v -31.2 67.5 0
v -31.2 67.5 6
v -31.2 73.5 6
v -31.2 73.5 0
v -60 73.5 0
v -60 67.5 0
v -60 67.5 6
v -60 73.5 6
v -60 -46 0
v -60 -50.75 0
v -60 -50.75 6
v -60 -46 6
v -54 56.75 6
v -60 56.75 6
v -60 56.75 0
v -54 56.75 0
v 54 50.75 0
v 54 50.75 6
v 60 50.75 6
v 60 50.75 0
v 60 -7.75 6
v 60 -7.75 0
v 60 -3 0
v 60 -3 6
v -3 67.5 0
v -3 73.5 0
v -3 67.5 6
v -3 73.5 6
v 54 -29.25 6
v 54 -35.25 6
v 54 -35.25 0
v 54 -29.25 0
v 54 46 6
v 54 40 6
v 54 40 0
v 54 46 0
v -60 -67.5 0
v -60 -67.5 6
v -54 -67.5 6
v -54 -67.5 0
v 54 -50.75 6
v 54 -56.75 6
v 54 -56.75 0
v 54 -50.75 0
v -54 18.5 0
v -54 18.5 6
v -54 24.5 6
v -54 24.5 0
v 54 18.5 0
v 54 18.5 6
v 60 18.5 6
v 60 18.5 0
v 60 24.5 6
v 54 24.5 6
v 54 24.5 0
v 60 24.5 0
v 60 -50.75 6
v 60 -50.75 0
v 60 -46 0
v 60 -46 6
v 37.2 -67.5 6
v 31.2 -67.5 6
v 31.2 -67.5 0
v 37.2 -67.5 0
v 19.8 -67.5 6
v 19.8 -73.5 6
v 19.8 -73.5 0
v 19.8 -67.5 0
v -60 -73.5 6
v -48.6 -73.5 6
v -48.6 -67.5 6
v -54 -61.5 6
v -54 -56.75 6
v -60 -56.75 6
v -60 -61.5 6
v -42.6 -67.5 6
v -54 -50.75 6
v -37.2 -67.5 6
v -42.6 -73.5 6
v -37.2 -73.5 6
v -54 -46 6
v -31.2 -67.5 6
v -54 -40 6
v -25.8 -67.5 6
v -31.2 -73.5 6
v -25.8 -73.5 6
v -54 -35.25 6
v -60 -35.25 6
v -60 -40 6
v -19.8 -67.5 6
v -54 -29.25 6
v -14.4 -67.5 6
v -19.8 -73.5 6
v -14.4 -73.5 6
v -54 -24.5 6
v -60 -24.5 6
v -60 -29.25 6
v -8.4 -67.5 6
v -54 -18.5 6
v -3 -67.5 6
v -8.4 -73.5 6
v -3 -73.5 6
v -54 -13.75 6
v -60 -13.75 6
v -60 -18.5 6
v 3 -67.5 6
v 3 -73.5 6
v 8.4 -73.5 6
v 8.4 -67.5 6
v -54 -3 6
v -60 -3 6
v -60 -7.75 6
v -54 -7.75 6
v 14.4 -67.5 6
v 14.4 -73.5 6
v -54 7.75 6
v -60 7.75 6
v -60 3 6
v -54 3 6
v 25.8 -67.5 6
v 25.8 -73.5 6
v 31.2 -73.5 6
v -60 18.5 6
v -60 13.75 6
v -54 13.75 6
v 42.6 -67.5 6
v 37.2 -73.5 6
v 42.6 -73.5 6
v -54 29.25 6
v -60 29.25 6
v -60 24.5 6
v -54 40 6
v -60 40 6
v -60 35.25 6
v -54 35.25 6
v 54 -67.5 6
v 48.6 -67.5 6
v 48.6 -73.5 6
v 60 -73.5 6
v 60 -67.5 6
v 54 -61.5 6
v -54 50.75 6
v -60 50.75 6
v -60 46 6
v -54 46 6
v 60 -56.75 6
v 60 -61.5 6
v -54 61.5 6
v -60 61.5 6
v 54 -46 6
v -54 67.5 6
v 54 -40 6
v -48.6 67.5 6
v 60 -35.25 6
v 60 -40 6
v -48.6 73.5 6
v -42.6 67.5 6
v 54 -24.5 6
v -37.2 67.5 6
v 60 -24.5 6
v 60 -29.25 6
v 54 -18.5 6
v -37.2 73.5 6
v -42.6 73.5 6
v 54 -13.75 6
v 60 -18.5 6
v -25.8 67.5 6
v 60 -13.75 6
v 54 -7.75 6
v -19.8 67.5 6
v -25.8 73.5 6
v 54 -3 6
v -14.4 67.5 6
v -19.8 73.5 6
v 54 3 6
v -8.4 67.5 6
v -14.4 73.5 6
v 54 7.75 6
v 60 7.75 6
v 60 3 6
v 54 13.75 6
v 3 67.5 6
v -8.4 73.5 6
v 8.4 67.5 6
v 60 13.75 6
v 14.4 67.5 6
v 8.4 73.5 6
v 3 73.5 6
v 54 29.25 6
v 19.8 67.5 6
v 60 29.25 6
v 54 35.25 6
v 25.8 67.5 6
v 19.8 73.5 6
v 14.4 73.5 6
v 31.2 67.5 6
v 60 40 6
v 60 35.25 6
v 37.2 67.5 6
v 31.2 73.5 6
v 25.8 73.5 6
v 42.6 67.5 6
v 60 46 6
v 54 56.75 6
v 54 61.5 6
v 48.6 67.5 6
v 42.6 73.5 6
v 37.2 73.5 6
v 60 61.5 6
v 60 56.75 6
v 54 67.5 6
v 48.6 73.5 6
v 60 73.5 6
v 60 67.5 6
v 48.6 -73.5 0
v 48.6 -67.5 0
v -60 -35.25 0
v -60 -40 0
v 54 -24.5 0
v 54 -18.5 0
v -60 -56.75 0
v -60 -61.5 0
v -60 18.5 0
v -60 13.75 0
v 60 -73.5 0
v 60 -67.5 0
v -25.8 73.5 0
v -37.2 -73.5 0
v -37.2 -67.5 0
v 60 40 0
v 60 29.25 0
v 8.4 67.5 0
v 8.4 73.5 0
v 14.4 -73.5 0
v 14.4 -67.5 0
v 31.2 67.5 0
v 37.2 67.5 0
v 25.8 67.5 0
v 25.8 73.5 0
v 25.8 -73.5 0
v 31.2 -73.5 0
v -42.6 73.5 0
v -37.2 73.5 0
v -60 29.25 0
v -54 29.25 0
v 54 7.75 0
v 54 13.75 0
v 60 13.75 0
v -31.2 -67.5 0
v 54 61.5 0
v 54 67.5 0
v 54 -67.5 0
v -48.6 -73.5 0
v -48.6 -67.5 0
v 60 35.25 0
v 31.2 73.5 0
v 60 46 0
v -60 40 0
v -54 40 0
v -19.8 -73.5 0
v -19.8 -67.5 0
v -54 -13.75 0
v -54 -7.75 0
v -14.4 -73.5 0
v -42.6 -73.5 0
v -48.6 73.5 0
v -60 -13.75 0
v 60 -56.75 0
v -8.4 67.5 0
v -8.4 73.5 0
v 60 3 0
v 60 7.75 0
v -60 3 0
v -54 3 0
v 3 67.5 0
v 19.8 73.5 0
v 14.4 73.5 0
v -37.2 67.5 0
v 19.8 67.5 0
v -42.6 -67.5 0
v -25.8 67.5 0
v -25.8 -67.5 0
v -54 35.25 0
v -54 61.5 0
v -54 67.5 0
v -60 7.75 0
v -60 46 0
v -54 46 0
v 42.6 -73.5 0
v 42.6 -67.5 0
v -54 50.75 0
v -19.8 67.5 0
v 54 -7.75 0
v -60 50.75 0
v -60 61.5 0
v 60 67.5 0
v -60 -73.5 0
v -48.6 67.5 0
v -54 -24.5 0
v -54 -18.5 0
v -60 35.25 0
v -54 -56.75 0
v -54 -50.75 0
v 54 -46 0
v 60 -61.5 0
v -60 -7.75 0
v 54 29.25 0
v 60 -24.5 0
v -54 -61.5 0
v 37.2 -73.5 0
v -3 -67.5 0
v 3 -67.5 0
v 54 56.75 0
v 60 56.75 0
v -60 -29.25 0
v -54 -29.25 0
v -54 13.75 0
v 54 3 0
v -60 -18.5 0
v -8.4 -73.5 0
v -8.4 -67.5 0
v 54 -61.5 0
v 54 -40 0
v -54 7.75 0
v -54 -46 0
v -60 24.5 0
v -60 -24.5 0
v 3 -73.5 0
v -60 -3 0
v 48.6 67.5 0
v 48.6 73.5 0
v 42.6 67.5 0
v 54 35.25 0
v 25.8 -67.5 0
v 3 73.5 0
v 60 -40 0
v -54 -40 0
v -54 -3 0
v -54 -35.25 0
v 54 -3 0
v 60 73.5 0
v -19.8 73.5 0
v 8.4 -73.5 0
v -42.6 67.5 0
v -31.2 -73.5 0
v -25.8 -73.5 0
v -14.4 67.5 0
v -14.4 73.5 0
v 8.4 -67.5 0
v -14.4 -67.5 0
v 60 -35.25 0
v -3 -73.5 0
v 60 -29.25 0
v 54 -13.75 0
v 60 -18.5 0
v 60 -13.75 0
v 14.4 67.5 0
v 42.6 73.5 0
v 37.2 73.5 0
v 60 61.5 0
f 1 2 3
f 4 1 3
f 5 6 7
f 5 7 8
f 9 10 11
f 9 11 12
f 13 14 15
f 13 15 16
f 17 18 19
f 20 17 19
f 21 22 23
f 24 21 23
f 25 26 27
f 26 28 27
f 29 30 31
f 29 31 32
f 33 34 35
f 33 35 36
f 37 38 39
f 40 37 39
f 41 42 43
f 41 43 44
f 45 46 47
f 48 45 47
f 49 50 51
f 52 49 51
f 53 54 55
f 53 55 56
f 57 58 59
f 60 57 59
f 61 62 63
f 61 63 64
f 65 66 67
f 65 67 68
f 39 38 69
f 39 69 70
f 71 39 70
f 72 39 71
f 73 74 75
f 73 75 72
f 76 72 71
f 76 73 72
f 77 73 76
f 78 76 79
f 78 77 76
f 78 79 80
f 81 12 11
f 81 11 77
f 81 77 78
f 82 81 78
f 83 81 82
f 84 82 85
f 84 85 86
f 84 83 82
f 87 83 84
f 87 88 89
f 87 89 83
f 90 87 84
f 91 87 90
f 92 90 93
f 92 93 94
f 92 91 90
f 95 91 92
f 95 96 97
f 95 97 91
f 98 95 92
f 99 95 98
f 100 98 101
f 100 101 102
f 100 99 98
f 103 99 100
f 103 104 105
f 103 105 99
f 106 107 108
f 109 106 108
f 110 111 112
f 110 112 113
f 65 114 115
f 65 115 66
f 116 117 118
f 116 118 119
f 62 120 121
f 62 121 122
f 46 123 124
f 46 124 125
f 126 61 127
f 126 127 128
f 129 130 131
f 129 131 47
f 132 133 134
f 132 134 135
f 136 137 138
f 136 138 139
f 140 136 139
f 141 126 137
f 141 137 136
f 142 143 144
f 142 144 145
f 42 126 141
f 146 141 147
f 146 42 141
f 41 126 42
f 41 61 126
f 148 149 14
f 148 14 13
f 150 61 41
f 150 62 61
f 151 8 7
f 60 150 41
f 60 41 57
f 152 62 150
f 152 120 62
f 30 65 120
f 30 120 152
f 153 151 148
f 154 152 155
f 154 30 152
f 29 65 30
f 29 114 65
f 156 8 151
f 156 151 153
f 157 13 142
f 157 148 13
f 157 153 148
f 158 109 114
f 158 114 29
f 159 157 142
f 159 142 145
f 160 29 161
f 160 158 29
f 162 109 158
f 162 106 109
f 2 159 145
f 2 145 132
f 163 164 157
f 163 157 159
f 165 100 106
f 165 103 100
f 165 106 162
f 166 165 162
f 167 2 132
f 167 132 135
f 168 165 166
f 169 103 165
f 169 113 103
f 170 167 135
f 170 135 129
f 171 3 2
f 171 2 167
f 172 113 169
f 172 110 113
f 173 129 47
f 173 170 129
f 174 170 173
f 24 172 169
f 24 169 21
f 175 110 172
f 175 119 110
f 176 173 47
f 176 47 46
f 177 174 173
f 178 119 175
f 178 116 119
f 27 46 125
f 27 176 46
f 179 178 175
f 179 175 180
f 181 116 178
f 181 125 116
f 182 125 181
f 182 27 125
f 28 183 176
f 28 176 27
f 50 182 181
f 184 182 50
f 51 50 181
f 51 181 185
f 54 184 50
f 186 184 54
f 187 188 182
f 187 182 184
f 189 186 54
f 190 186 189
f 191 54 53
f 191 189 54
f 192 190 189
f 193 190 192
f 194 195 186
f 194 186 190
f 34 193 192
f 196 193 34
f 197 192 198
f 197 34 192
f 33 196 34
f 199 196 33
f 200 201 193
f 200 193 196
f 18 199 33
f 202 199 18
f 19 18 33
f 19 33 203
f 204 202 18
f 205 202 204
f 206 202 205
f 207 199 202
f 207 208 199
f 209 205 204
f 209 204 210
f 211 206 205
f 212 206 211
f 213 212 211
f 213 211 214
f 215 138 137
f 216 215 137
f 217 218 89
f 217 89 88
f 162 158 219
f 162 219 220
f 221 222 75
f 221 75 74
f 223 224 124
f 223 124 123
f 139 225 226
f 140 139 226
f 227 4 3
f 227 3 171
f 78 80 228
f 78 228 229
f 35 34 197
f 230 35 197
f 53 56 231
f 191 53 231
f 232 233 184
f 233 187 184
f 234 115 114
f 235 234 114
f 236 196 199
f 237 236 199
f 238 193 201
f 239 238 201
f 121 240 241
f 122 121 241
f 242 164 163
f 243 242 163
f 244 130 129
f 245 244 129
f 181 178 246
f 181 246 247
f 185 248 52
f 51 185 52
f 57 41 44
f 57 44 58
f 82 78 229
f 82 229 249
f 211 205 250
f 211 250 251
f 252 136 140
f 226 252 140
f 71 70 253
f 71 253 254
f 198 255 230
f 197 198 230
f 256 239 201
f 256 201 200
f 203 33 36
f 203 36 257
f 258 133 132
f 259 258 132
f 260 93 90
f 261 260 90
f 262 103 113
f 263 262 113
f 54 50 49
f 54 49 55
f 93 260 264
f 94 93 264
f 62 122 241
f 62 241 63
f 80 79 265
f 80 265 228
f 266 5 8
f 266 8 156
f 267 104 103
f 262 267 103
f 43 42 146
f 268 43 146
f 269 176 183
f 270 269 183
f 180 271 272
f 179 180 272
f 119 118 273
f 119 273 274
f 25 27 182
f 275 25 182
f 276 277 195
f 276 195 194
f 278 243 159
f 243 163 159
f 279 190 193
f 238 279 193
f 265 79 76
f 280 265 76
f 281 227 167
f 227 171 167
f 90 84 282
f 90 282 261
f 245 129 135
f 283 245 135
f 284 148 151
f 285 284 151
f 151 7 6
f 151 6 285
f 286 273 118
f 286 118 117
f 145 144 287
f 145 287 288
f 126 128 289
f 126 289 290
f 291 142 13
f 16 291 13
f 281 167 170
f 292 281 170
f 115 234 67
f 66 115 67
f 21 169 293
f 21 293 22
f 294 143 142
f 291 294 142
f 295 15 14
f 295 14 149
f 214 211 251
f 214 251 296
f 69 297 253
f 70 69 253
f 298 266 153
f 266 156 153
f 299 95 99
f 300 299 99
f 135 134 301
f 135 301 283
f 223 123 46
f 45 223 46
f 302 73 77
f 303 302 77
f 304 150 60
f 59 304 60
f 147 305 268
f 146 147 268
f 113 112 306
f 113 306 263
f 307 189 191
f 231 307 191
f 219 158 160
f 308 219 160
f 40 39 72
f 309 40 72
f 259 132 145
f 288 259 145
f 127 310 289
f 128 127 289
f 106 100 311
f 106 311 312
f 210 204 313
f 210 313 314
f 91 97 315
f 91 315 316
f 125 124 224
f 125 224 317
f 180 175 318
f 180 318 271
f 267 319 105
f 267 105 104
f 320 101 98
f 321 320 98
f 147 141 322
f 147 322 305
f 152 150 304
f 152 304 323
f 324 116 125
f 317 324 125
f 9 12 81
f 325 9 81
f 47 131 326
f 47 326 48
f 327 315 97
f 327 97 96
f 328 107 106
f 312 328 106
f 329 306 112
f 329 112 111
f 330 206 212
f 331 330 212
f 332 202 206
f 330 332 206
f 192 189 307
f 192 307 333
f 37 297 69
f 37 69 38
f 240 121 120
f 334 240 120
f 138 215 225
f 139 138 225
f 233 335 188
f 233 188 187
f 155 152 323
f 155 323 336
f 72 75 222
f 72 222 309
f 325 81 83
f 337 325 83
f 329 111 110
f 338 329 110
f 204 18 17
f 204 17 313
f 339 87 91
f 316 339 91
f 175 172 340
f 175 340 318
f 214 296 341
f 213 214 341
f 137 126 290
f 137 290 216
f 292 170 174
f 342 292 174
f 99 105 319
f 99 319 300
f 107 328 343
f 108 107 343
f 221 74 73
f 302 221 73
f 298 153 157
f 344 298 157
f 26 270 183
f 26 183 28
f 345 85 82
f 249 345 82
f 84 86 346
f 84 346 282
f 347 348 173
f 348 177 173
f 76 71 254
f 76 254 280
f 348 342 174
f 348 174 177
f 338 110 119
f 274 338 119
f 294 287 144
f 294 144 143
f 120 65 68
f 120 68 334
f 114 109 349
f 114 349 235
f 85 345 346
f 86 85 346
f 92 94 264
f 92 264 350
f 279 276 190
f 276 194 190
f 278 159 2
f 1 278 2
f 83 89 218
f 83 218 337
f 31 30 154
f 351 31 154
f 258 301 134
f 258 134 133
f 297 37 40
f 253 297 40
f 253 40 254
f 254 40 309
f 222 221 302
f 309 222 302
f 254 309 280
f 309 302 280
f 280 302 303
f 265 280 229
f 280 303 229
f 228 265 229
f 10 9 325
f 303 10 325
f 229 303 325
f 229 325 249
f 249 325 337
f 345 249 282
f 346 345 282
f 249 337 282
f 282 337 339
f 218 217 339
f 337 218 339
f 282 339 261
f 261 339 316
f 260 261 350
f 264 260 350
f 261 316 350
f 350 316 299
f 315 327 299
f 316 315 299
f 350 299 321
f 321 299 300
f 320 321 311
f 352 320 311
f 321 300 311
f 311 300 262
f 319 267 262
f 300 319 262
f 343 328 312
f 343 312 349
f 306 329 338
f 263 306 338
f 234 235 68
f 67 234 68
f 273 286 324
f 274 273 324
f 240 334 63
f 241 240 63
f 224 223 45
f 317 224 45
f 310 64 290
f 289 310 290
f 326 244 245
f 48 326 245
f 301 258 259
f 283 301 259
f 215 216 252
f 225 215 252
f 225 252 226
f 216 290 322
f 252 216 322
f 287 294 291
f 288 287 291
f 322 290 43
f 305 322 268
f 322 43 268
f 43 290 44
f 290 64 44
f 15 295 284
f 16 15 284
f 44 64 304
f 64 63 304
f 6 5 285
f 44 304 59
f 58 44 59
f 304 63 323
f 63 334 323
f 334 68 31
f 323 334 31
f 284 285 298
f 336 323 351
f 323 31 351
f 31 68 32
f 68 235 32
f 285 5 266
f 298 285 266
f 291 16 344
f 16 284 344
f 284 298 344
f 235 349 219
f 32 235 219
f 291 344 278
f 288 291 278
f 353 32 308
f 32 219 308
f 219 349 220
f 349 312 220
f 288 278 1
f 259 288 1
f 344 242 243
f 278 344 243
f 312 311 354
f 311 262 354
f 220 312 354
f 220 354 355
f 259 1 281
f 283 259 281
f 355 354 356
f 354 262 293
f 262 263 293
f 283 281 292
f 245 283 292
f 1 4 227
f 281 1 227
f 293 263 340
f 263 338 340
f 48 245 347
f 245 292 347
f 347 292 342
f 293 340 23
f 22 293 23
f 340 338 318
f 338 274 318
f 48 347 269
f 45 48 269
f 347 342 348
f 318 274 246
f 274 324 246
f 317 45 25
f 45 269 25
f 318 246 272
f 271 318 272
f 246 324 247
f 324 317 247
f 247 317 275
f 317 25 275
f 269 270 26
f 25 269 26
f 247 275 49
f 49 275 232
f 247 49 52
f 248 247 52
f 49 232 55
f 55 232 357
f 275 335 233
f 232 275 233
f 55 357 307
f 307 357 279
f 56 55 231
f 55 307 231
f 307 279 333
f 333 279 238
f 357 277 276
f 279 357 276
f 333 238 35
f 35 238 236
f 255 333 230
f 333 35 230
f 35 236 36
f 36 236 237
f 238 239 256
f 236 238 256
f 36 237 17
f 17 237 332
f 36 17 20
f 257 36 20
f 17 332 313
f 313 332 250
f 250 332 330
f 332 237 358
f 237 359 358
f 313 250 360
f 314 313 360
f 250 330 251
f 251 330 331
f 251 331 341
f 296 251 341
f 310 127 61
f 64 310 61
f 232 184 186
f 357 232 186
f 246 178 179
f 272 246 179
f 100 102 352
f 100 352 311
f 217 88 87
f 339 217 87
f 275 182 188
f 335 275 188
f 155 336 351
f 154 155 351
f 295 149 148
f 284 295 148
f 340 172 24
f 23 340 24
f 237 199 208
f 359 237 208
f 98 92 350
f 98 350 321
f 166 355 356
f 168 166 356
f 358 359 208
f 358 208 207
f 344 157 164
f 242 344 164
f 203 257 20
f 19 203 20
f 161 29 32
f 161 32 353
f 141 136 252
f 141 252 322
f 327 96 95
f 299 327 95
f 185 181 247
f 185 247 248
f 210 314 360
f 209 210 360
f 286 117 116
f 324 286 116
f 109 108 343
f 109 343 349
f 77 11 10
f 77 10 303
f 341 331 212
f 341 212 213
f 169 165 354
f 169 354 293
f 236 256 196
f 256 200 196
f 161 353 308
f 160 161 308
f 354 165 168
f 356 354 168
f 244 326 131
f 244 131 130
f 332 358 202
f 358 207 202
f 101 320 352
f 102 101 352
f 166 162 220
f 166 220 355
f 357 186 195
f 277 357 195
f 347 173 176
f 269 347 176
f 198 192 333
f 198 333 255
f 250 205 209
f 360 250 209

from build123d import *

# Parameters (mm, degrees)
ESBO_O1_W                = 120
ESBO_O1_H                = 147
RESSALTO_EXTRUS_O1_DEPTH = 6
CORTE_EXTRUS_O1_DEPTH    = 96.069711265
ESBO_O3_W                = 6
ESBO_O3_H                = 6
CORTE_EXTRUS_O2_DEPTH    = 96.069711265
PADR_O_LINEAR1_COUNT     = 7
PADR_O_LINEAR1_PITCH     = 10.75
PADR_O_LINEAR1_COL_COUNT = 7
PADR_O_LINEAR1_COL_PITCH = 10.75
PADR_O_LINEAR2_COUNT     = 5
PADR_O_LINEAR2_PITCH     = 11.4
PADR_O_LINEAR3_COUNT     = 5
PADR_O_LINEAR3_PITCH     = 11.4
ESBO_O4_W                = 6
ESBO_O4_H                = 6
CORTE_EXTRUS_O3_DEPTH    = 96.069711265
PADR_O_LINEAR4_COUNT     = 5
PADR_O_LINEAR4_PITCH     = 11.4
PADR_O_LINEAR5_COUNT     = 5
PADR_O_LINEAR5_PITCH     = 11.4


with BuildPart() as part:
    # Esboço1 → Ressalto-extrusão1 (new body)
    with BuildSketch(Plane.XY):
        Rectangle(ESBO_O1_W, ESBO_O1_H)
    extrude(amount=RESSALTO_EXTRUS_O1_DEPTH)

    # Esboço2 → Corte-extrusão1 (cut, symmetric)
    with BuildSketch(Plane.XY.offset(6)):
        Polygon((-3, 403.362470446), (-3, 73.5), (-3, 67.5), (3, 67.5), (3, 73.5), (3, 403.362470446), (3, 1063.087411339), (-3, 1063.087411339), align=None)
    corte_extrus_o1 = extrude(amount=CORTE_EXTRUS_O1_DEPTH, both=True, mode=Mode.SUBTRACT)

    # Esboço3 → Corte-extrusão2 (cut, through all)
    with BuildSketch(Plane.XY.offset(6)):
        with Locations((-57, 0)):
            Rectangle(ESBO_O3_W, ESBO_O3_H)
        with Locations((57, 0)):
            Rectangle(ESBO_O3_W, ESBO_O3_H)
    corte_extrus_o2 = extrude(amount=-CORTE_EXTRUS_O2_DEPTH, mode=Mode.SUBTRACT)

    # Padrão linear1: Corte-extrusão2 ×7
    with Locations(*[(0, i * PADR_O_LINEAR1_PITCH, 0) for i in range(1, PADR_O_LINEAR1_COUNT)]):
        add(corte_extrus_o2, mode=Mode.SUBTRACT)

    # Padrão linear1 col: Corte-extrusão2 ×7
    with Locations(*[(0, -i * PADR_O_LINEAR1_COL_PITCH, 0) for i in range(1, PADR_O_LINEAR1_COL_COUNT)]):
        add(corte_extrus_o2, mode=Mode.SUBTRACT)

    # Padrão linear2: Corte-extrusão1 ×5
    with Locations(*[(-i * PADR_O_LINEAR2_PITCH, 0, 0) for i in range(1, PADR_O_LINEAR2_COUNT)]):
        add(corte_extrus_o1, mode=Mode.SUBTRACT)

    # Padrão linear3: Corte-extrusão1 ×5
    with Locations(*[(i * PADR_O_LINEAR3_PITCH, 0, 0) for i in range(1, PADR_O_LINEAR3_COUNT)]):
        add(corte_extrus_o1, mode=Mode.SUBTRACT)

    # Esboço4 → Corte-extrusão3 (cut, through all)
    with BuildSketch(Plane.XY.offset(6)):
        with Locations((0, -70.5)):
            Rectangle(ESBO_O4_W, ESBO_O4_H)
    corte_extrus_o3 = extrude(amount=-CORTE_EXTRUS_O3_DEPTH, mode=Mode.SUBTRACT)

    # Padrão linear4: Corte-extrusão3 ×5
    with Locations(*[(-i * PADR_O_LINEAR4_PITCH, 0, 0) for i in range(1, PADR_O_LINEAR4_COUNT)]):
        add(corte_extrus_o3, mode=Mode.SUBTRACT)

    # Padrão linear5: Corte-extrusão3 ×5
    with Locations(*[(i * PADR_O_LINEAR5_PITCH, 0, 0) for i in range(1, PADR_O_LINEAR5_COUNT)]):
        add(corte_extrus_o3, mode=Mode.SUBTRACT)


solid = part.part
